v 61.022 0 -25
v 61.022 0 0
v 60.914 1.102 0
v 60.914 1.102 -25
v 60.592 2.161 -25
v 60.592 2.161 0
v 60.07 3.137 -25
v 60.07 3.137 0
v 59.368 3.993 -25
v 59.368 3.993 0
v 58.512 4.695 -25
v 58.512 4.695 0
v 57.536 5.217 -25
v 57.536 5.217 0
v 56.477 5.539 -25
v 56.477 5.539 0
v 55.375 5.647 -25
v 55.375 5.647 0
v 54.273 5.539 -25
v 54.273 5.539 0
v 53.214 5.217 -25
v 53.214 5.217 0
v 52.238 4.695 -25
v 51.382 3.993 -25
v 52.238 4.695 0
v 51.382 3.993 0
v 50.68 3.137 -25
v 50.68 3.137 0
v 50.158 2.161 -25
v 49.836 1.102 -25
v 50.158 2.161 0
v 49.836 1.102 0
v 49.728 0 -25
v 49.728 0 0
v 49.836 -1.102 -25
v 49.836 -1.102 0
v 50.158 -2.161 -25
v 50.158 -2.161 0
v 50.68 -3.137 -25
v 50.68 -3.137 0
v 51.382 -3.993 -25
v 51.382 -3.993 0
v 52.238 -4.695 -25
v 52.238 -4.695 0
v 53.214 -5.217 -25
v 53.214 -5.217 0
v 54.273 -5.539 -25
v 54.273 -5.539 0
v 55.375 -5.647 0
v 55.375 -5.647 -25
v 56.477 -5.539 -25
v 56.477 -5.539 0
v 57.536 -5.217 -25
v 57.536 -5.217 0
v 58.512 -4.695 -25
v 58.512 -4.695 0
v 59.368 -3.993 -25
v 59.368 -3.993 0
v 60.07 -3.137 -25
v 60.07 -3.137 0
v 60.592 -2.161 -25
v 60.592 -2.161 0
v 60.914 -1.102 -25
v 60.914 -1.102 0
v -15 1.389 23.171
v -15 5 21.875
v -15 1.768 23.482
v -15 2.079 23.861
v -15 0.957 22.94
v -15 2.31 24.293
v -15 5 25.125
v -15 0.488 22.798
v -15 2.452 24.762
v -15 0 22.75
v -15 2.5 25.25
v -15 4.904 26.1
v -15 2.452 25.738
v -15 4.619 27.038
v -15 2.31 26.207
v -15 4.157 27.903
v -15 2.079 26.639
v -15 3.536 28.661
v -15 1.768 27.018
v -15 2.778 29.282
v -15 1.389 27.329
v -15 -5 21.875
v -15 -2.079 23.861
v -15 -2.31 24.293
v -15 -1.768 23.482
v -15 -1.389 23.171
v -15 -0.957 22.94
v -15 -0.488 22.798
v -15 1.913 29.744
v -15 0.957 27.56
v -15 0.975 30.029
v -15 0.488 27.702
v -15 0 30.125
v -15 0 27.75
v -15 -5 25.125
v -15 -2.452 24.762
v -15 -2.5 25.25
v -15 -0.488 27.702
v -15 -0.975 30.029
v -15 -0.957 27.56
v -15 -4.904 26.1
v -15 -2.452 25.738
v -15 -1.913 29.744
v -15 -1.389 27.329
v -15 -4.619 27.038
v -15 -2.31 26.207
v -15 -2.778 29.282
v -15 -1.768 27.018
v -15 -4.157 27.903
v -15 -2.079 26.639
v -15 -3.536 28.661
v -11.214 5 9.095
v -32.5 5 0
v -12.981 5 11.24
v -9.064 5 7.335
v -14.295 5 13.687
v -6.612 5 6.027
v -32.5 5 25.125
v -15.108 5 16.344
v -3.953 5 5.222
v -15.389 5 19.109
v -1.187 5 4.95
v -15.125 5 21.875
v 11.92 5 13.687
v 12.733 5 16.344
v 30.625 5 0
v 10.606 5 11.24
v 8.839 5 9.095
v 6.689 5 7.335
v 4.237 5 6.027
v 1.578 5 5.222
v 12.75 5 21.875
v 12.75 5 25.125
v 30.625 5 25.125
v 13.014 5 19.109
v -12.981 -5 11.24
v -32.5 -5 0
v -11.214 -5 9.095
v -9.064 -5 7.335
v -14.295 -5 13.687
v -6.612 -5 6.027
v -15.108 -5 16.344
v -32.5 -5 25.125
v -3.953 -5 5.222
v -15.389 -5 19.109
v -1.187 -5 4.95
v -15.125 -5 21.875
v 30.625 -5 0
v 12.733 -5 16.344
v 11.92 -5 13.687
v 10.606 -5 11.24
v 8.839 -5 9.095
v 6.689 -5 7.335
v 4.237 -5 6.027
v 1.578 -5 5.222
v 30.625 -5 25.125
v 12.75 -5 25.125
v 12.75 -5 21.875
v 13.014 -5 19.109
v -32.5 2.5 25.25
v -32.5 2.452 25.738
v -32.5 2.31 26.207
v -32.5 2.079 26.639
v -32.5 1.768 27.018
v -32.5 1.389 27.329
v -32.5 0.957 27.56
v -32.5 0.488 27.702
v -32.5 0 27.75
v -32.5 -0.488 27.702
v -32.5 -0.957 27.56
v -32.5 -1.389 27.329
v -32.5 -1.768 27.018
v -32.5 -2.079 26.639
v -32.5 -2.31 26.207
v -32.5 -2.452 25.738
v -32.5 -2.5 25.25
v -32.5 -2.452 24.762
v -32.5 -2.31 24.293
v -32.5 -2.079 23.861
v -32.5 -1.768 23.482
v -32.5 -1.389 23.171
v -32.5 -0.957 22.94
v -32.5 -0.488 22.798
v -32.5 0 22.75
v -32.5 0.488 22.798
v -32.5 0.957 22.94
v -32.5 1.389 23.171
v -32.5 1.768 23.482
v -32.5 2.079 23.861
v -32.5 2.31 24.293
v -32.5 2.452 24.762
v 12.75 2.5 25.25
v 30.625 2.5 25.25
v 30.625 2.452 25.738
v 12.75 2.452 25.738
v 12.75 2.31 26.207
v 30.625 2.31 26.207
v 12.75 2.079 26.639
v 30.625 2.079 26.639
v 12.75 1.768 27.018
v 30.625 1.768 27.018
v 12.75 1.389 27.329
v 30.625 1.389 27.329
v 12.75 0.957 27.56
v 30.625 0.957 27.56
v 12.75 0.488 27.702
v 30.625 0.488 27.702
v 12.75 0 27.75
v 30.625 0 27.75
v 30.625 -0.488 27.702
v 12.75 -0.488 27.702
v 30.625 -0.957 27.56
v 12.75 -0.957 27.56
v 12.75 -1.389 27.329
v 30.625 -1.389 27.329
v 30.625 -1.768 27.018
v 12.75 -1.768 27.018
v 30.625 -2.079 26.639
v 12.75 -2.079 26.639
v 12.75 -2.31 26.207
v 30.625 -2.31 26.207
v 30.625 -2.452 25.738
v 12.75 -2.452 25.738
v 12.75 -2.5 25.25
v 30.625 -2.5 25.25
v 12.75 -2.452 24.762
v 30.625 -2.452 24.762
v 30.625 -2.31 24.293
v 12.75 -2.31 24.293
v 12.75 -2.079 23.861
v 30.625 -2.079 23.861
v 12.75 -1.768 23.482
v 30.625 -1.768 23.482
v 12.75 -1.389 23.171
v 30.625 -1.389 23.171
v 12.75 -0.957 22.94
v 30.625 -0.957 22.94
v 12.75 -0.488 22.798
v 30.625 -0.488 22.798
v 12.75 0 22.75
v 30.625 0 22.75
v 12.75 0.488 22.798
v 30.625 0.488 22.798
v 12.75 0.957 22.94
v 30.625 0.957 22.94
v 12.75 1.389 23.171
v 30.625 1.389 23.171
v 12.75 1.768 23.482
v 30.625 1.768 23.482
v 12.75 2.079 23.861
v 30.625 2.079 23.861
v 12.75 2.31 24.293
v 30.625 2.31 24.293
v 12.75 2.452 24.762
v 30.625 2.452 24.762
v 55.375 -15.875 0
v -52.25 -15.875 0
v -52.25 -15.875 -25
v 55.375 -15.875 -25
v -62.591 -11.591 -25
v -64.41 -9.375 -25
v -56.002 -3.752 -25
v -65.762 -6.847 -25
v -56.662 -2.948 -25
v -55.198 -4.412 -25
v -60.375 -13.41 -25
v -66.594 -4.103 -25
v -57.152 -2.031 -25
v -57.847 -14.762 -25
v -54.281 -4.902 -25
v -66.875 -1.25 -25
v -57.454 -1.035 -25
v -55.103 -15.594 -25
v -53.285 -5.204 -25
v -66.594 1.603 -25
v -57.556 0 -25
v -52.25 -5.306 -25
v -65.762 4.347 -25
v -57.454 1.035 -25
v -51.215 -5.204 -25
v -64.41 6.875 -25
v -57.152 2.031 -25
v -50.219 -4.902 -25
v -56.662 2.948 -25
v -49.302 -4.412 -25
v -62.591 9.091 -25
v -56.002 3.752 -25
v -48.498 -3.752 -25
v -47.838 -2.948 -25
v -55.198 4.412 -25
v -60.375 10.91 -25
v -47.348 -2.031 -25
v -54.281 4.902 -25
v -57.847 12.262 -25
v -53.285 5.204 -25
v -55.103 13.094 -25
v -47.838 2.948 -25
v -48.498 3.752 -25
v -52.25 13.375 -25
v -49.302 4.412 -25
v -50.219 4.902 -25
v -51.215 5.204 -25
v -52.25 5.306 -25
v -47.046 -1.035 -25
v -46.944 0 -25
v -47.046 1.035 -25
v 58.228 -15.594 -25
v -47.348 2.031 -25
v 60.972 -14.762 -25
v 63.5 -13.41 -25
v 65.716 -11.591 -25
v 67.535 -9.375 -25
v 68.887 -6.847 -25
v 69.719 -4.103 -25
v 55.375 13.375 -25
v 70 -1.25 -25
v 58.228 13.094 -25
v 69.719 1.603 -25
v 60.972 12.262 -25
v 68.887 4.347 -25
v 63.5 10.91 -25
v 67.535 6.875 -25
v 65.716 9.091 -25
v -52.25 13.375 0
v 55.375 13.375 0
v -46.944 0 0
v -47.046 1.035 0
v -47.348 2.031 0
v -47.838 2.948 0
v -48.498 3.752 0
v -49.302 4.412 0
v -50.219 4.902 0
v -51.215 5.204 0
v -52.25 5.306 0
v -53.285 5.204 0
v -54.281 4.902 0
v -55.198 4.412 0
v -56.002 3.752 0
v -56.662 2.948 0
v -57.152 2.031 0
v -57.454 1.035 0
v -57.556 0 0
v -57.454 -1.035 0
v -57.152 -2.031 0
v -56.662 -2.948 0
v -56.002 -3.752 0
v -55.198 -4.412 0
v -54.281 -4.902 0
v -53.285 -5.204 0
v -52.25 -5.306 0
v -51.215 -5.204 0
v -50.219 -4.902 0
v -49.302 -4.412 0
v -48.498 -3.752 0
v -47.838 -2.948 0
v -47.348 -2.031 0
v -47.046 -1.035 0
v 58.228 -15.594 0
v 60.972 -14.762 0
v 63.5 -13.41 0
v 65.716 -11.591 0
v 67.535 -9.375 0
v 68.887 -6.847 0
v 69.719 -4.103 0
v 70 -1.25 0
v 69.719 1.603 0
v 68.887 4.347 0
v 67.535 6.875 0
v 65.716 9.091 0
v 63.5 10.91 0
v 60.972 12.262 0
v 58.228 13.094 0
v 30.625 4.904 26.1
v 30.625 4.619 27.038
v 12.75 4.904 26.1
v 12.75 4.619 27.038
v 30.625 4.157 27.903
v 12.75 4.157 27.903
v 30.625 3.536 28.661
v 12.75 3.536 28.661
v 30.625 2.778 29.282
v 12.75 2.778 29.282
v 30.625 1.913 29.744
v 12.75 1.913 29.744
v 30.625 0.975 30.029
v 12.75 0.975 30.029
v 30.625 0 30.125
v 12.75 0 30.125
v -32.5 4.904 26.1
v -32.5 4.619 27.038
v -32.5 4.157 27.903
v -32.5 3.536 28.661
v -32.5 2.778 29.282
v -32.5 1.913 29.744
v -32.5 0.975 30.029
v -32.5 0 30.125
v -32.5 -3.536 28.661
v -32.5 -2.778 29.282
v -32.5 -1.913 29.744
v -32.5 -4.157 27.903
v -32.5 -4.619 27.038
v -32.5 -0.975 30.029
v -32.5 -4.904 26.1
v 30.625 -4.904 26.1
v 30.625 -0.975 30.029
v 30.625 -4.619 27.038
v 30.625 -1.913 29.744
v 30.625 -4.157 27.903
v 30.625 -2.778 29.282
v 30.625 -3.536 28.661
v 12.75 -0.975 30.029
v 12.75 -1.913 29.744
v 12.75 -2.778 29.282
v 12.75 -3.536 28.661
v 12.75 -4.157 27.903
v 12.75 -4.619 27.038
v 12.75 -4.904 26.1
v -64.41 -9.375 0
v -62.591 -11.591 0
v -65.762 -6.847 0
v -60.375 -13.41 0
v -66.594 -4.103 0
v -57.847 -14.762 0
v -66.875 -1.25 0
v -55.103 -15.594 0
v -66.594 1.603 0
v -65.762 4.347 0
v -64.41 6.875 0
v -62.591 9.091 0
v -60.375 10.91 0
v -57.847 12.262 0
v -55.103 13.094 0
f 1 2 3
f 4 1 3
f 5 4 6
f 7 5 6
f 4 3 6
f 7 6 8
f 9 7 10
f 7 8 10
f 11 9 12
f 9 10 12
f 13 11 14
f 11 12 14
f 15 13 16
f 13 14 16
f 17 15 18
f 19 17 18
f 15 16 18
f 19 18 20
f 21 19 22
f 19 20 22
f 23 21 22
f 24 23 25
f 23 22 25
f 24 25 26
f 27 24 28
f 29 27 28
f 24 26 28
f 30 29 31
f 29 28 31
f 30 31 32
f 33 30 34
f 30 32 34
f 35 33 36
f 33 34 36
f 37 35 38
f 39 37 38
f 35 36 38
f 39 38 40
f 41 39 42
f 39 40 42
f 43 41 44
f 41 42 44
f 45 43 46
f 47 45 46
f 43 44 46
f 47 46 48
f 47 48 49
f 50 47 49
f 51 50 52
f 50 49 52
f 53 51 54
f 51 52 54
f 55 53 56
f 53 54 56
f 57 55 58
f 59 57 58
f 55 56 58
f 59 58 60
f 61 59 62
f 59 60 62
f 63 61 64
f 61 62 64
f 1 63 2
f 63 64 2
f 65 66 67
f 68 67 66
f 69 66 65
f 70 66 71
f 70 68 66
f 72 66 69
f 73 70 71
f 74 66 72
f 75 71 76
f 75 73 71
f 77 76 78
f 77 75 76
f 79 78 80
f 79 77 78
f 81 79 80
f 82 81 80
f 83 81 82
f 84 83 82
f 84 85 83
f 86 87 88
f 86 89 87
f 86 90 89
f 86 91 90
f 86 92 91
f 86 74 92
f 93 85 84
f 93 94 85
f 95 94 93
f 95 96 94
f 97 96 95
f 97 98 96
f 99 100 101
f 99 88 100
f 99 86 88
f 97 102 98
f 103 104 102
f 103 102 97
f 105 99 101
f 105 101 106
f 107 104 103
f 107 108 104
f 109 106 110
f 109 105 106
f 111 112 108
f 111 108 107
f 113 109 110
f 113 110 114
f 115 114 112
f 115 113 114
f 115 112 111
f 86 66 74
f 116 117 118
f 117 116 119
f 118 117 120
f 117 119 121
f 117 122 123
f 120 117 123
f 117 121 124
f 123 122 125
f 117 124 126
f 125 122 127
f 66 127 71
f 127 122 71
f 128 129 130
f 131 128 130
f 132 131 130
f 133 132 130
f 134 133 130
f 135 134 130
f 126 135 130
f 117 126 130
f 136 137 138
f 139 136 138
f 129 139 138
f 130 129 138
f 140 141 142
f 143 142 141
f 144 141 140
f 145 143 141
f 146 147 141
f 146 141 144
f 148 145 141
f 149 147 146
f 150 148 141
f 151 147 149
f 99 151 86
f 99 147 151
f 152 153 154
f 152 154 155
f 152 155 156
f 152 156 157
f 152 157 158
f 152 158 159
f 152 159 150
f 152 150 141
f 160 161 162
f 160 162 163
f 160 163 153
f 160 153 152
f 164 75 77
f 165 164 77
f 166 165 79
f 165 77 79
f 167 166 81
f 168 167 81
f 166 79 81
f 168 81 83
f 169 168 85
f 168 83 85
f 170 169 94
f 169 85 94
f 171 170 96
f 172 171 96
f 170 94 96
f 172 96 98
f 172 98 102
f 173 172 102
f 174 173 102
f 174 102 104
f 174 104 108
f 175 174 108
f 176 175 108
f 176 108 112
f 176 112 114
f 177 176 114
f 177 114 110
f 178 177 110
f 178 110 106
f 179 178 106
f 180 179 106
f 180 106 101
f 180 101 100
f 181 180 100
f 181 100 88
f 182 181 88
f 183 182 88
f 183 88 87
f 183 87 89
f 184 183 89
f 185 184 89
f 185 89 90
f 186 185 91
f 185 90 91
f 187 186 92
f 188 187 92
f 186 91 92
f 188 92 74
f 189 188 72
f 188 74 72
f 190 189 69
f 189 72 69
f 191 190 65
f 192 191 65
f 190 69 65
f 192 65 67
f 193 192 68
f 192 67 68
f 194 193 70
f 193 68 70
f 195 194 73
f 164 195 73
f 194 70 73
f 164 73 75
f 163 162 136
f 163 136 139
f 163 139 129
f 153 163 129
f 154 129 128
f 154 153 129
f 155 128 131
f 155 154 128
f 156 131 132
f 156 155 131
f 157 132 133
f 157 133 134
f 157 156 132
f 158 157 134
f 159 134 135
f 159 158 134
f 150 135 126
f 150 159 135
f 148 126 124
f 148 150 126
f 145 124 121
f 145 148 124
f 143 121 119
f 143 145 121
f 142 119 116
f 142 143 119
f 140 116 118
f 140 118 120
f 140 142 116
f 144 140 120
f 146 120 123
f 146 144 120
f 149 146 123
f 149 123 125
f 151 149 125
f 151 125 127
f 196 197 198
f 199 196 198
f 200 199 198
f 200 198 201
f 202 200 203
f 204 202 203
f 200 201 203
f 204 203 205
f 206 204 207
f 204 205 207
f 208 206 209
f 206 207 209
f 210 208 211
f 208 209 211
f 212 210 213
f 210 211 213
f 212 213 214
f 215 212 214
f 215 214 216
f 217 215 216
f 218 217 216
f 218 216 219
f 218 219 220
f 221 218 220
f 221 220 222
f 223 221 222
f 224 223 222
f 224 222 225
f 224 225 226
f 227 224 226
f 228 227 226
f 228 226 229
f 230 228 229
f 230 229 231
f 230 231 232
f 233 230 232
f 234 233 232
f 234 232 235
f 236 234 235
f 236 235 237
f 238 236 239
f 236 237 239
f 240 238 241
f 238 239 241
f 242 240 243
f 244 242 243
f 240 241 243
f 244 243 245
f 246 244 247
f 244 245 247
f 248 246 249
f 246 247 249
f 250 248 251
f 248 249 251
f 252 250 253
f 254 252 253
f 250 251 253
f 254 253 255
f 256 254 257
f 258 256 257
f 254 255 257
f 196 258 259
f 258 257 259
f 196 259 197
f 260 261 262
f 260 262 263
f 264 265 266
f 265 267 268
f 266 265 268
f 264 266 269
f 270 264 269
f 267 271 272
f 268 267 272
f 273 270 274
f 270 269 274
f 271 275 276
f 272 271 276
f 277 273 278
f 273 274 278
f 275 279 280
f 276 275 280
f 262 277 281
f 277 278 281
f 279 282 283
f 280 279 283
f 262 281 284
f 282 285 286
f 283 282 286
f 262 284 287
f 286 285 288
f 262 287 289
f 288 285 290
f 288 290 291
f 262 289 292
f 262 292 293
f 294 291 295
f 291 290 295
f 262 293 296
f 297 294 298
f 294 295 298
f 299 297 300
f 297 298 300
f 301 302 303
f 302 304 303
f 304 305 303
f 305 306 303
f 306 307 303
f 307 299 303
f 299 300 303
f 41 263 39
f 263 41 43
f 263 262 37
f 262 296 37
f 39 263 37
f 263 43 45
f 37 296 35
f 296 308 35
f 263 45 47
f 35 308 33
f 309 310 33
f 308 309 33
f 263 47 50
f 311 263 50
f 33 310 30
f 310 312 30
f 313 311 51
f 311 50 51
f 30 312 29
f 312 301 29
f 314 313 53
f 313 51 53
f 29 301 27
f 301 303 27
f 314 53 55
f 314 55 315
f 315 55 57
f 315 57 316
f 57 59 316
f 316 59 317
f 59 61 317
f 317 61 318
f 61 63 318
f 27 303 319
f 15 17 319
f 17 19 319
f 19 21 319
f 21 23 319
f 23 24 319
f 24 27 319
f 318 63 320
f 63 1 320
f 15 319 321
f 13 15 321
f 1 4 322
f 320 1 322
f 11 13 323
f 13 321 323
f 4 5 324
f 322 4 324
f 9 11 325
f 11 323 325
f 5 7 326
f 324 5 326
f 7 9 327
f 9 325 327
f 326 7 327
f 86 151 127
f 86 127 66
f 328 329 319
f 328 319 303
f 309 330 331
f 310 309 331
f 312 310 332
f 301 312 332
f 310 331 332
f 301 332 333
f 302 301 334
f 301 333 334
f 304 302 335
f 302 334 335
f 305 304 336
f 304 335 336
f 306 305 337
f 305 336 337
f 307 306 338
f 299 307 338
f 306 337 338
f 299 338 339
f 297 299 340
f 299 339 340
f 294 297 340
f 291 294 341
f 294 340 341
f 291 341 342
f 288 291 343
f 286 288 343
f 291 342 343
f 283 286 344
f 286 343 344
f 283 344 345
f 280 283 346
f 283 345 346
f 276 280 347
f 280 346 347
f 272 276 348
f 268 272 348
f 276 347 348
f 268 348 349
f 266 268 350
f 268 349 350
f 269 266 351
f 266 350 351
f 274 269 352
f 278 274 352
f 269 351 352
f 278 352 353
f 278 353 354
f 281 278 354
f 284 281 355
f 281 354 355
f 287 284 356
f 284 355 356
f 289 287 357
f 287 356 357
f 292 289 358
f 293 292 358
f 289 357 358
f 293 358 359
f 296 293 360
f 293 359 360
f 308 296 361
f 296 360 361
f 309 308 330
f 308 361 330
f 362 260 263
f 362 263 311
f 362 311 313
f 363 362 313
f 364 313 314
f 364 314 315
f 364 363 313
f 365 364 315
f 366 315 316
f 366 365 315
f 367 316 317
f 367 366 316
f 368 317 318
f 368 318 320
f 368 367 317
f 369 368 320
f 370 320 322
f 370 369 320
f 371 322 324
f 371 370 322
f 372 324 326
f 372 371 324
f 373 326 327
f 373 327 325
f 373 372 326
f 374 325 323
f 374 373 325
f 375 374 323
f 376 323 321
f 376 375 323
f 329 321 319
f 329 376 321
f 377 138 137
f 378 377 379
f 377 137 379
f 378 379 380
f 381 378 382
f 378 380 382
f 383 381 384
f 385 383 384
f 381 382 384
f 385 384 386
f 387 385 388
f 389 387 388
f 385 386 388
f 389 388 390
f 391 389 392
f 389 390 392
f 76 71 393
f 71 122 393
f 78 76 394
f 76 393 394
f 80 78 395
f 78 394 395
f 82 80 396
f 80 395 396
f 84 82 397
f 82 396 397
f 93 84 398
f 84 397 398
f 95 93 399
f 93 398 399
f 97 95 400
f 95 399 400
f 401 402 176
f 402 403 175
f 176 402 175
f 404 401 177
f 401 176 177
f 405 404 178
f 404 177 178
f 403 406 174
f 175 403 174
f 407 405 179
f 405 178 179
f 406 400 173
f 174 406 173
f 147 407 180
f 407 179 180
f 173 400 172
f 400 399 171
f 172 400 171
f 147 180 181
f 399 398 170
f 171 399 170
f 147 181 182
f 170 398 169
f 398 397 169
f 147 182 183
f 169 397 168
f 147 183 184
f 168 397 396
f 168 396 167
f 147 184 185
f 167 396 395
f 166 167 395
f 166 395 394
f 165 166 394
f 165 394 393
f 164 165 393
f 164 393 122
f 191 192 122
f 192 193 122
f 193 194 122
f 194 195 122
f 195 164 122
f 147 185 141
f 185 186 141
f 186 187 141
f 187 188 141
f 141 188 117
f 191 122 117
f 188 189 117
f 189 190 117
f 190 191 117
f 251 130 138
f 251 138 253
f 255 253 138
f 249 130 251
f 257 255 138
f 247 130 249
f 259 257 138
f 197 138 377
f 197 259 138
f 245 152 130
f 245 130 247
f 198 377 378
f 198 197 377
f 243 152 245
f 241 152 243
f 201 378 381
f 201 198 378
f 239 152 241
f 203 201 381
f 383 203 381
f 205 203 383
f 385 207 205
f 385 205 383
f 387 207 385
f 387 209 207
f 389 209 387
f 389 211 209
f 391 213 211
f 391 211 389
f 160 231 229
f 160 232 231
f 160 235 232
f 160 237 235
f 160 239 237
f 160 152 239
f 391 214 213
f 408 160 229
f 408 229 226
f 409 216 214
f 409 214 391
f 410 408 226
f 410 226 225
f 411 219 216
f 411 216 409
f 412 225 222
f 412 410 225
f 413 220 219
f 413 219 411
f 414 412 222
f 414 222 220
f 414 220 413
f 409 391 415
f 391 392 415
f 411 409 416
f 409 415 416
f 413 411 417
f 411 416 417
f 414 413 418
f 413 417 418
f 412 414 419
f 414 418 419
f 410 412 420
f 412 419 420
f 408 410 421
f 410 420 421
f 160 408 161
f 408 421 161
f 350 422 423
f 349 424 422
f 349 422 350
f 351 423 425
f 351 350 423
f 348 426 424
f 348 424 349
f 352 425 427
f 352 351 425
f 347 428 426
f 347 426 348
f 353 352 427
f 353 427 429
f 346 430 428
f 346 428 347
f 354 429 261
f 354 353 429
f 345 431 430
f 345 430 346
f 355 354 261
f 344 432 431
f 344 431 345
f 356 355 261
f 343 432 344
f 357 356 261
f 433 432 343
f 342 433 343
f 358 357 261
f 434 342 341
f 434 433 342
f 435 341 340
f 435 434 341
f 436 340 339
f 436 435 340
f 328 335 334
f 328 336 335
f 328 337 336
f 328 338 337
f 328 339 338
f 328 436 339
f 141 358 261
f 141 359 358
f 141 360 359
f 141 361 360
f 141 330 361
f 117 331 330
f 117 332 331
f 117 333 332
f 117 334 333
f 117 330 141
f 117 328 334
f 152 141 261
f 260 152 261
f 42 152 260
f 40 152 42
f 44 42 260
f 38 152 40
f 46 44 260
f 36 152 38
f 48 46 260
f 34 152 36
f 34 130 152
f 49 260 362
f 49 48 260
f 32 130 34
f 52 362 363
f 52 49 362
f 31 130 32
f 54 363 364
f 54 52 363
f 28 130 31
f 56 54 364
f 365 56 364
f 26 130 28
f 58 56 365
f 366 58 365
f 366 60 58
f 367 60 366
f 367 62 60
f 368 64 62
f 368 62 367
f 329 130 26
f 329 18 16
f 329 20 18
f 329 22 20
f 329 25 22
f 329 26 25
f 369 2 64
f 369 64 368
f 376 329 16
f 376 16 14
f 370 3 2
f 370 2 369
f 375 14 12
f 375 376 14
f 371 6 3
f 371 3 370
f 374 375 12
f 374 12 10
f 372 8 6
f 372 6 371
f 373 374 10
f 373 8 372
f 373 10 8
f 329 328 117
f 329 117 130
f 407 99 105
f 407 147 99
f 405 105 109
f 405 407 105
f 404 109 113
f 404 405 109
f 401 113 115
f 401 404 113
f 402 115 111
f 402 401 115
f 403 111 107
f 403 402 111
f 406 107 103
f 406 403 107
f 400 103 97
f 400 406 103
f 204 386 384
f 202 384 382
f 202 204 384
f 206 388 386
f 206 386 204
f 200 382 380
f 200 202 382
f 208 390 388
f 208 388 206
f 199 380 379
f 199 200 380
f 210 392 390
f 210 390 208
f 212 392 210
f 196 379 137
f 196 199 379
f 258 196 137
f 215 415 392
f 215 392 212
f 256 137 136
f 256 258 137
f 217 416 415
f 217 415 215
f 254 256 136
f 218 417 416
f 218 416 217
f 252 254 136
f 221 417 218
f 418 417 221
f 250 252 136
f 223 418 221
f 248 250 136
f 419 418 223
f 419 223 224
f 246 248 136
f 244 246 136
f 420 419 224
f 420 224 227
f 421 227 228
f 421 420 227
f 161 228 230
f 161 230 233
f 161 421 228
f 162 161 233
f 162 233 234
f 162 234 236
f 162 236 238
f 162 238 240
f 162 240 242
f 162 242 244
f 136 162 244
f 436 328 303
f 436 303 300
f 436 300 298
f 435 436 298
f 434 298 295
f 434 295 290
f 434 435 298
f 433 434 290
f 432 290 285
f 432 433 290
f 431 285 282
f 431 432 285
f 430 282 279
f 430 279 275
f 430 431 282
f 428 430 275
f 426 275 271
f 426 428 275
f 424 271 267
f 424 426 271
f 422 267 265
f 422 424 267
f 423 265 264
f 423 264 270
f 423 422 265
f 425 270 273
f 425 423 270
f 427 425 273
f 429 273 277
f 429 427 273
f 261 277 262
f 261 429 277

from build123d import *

# Parameters (mm, degrees)
F0_R          = 5.3062476442
F0_R_2        = 5.6471789454
F2_DEPTH      = 25
F3_DEPTH      = 5
F3_DEPTH_BACK = 5
F5_D          = 5
F6_R          = 4.99999


# Not quite as in the source:
# - a fillet or chamfer is up to 0.001 mm smaller than in the source, because OpenCascade refuses the exact size


with BuildPart() as f2:
    # F0 (on Top) → F2 (new body)
    with BuildSketch(Plane.XY):
        with BuildLine():
            Line((55.3750023246, 13.3750010282), (-52.2500015795, 13.3750010282))
            ThreePointArc((-52.2500015795, 13.3750010282), (-66.8750023469, -1.2499997392), (-52.2500015795, -15.8750005066))
            Line((-52.2500015795, -15.8750005066), (55.3750023246, -15.8750005066))
            ThreePointArc((55.3750023246, -15.8750005066), (70.000003092, -1.2499997392), (55.3750023246, 13.3750010282))
        make_face()
        with Locations((-52.2500015795, 0)):
            Circle(F0_R, mode=Mode.SUBTRACT)
        with Locations((55.3750023246, 0)):
            Circle(F0_R_2, mode=Mode.SUBTRACT)
    extrude(amount=-F2_DEPTH)

    # F1 (on Front) → F3 (join, two sides)
    with BuildSketch(Plane.XZ) as f3_sk:
        with BuildLine():
            Line((-32.5000025332, 21.8750014901), (-32.5000025332, 0))
            Line((-32.5000025332, 0), (30.625000596, 0))
            Line((30.625000596, 0), (30.625000596, 21.8750014901))
            Line((30.625000596, 21.8750014901), (30.625000596, 30.1250014454))
            Line((30.625000596, 30.1250014454), (12.7500016242, 30.1250014454))
            Line((12.7500016242, 30.1250014454), (12.7500016242, 21.8750014901))
            ThreePointArc((12.7500016242, 21.8750014901), (-1.1874996126, 4.9502638014), (-15.1250008494, 21.8750014901))
            Line((-15.1250008494, 21.8750014901), (-15.000000596, 21.8750014901))
            Line((-15.000000596, 21.8750014901), (-15.000000596, 30.1250014454))
            Line((-15.000000596, 30.1250014454), (-32.5000025332, 30.1250014454))
            Line((-32.5000025332, 30.1250014454), (-32.5000025332, 21.8750014901))
        make_face()
    extrude(amount=F3_DEPTH)
    extrude(f3_sk.sketch, amount=-F3_DEPTH_BACK)

    # F5 (through all)
    with Locations(Plane(origin=(-32.5000025332, 0, 0), x_dir=(0, -1, 0), z_dir=(-1, 0, 0))):
        with Locations((0, 25.2500027418)):
            Hole(F5_D / 2)

    # F6 (radius 5 in the source; OpenCascade refuses exactly that, so slightly less here)
    f6_edges = [f2.edges().sort_by_distance(p)[0] for p in [
        (21.687501, 5, 30.125001),
        (21.687501, -5, 30.125001),
        (-23.750002, 5, 30.125001),
        (-23.750002, -5, 30.125001),
    ]]
    fillet(f6_edges, radius=F6_R)


solid = f2.part
